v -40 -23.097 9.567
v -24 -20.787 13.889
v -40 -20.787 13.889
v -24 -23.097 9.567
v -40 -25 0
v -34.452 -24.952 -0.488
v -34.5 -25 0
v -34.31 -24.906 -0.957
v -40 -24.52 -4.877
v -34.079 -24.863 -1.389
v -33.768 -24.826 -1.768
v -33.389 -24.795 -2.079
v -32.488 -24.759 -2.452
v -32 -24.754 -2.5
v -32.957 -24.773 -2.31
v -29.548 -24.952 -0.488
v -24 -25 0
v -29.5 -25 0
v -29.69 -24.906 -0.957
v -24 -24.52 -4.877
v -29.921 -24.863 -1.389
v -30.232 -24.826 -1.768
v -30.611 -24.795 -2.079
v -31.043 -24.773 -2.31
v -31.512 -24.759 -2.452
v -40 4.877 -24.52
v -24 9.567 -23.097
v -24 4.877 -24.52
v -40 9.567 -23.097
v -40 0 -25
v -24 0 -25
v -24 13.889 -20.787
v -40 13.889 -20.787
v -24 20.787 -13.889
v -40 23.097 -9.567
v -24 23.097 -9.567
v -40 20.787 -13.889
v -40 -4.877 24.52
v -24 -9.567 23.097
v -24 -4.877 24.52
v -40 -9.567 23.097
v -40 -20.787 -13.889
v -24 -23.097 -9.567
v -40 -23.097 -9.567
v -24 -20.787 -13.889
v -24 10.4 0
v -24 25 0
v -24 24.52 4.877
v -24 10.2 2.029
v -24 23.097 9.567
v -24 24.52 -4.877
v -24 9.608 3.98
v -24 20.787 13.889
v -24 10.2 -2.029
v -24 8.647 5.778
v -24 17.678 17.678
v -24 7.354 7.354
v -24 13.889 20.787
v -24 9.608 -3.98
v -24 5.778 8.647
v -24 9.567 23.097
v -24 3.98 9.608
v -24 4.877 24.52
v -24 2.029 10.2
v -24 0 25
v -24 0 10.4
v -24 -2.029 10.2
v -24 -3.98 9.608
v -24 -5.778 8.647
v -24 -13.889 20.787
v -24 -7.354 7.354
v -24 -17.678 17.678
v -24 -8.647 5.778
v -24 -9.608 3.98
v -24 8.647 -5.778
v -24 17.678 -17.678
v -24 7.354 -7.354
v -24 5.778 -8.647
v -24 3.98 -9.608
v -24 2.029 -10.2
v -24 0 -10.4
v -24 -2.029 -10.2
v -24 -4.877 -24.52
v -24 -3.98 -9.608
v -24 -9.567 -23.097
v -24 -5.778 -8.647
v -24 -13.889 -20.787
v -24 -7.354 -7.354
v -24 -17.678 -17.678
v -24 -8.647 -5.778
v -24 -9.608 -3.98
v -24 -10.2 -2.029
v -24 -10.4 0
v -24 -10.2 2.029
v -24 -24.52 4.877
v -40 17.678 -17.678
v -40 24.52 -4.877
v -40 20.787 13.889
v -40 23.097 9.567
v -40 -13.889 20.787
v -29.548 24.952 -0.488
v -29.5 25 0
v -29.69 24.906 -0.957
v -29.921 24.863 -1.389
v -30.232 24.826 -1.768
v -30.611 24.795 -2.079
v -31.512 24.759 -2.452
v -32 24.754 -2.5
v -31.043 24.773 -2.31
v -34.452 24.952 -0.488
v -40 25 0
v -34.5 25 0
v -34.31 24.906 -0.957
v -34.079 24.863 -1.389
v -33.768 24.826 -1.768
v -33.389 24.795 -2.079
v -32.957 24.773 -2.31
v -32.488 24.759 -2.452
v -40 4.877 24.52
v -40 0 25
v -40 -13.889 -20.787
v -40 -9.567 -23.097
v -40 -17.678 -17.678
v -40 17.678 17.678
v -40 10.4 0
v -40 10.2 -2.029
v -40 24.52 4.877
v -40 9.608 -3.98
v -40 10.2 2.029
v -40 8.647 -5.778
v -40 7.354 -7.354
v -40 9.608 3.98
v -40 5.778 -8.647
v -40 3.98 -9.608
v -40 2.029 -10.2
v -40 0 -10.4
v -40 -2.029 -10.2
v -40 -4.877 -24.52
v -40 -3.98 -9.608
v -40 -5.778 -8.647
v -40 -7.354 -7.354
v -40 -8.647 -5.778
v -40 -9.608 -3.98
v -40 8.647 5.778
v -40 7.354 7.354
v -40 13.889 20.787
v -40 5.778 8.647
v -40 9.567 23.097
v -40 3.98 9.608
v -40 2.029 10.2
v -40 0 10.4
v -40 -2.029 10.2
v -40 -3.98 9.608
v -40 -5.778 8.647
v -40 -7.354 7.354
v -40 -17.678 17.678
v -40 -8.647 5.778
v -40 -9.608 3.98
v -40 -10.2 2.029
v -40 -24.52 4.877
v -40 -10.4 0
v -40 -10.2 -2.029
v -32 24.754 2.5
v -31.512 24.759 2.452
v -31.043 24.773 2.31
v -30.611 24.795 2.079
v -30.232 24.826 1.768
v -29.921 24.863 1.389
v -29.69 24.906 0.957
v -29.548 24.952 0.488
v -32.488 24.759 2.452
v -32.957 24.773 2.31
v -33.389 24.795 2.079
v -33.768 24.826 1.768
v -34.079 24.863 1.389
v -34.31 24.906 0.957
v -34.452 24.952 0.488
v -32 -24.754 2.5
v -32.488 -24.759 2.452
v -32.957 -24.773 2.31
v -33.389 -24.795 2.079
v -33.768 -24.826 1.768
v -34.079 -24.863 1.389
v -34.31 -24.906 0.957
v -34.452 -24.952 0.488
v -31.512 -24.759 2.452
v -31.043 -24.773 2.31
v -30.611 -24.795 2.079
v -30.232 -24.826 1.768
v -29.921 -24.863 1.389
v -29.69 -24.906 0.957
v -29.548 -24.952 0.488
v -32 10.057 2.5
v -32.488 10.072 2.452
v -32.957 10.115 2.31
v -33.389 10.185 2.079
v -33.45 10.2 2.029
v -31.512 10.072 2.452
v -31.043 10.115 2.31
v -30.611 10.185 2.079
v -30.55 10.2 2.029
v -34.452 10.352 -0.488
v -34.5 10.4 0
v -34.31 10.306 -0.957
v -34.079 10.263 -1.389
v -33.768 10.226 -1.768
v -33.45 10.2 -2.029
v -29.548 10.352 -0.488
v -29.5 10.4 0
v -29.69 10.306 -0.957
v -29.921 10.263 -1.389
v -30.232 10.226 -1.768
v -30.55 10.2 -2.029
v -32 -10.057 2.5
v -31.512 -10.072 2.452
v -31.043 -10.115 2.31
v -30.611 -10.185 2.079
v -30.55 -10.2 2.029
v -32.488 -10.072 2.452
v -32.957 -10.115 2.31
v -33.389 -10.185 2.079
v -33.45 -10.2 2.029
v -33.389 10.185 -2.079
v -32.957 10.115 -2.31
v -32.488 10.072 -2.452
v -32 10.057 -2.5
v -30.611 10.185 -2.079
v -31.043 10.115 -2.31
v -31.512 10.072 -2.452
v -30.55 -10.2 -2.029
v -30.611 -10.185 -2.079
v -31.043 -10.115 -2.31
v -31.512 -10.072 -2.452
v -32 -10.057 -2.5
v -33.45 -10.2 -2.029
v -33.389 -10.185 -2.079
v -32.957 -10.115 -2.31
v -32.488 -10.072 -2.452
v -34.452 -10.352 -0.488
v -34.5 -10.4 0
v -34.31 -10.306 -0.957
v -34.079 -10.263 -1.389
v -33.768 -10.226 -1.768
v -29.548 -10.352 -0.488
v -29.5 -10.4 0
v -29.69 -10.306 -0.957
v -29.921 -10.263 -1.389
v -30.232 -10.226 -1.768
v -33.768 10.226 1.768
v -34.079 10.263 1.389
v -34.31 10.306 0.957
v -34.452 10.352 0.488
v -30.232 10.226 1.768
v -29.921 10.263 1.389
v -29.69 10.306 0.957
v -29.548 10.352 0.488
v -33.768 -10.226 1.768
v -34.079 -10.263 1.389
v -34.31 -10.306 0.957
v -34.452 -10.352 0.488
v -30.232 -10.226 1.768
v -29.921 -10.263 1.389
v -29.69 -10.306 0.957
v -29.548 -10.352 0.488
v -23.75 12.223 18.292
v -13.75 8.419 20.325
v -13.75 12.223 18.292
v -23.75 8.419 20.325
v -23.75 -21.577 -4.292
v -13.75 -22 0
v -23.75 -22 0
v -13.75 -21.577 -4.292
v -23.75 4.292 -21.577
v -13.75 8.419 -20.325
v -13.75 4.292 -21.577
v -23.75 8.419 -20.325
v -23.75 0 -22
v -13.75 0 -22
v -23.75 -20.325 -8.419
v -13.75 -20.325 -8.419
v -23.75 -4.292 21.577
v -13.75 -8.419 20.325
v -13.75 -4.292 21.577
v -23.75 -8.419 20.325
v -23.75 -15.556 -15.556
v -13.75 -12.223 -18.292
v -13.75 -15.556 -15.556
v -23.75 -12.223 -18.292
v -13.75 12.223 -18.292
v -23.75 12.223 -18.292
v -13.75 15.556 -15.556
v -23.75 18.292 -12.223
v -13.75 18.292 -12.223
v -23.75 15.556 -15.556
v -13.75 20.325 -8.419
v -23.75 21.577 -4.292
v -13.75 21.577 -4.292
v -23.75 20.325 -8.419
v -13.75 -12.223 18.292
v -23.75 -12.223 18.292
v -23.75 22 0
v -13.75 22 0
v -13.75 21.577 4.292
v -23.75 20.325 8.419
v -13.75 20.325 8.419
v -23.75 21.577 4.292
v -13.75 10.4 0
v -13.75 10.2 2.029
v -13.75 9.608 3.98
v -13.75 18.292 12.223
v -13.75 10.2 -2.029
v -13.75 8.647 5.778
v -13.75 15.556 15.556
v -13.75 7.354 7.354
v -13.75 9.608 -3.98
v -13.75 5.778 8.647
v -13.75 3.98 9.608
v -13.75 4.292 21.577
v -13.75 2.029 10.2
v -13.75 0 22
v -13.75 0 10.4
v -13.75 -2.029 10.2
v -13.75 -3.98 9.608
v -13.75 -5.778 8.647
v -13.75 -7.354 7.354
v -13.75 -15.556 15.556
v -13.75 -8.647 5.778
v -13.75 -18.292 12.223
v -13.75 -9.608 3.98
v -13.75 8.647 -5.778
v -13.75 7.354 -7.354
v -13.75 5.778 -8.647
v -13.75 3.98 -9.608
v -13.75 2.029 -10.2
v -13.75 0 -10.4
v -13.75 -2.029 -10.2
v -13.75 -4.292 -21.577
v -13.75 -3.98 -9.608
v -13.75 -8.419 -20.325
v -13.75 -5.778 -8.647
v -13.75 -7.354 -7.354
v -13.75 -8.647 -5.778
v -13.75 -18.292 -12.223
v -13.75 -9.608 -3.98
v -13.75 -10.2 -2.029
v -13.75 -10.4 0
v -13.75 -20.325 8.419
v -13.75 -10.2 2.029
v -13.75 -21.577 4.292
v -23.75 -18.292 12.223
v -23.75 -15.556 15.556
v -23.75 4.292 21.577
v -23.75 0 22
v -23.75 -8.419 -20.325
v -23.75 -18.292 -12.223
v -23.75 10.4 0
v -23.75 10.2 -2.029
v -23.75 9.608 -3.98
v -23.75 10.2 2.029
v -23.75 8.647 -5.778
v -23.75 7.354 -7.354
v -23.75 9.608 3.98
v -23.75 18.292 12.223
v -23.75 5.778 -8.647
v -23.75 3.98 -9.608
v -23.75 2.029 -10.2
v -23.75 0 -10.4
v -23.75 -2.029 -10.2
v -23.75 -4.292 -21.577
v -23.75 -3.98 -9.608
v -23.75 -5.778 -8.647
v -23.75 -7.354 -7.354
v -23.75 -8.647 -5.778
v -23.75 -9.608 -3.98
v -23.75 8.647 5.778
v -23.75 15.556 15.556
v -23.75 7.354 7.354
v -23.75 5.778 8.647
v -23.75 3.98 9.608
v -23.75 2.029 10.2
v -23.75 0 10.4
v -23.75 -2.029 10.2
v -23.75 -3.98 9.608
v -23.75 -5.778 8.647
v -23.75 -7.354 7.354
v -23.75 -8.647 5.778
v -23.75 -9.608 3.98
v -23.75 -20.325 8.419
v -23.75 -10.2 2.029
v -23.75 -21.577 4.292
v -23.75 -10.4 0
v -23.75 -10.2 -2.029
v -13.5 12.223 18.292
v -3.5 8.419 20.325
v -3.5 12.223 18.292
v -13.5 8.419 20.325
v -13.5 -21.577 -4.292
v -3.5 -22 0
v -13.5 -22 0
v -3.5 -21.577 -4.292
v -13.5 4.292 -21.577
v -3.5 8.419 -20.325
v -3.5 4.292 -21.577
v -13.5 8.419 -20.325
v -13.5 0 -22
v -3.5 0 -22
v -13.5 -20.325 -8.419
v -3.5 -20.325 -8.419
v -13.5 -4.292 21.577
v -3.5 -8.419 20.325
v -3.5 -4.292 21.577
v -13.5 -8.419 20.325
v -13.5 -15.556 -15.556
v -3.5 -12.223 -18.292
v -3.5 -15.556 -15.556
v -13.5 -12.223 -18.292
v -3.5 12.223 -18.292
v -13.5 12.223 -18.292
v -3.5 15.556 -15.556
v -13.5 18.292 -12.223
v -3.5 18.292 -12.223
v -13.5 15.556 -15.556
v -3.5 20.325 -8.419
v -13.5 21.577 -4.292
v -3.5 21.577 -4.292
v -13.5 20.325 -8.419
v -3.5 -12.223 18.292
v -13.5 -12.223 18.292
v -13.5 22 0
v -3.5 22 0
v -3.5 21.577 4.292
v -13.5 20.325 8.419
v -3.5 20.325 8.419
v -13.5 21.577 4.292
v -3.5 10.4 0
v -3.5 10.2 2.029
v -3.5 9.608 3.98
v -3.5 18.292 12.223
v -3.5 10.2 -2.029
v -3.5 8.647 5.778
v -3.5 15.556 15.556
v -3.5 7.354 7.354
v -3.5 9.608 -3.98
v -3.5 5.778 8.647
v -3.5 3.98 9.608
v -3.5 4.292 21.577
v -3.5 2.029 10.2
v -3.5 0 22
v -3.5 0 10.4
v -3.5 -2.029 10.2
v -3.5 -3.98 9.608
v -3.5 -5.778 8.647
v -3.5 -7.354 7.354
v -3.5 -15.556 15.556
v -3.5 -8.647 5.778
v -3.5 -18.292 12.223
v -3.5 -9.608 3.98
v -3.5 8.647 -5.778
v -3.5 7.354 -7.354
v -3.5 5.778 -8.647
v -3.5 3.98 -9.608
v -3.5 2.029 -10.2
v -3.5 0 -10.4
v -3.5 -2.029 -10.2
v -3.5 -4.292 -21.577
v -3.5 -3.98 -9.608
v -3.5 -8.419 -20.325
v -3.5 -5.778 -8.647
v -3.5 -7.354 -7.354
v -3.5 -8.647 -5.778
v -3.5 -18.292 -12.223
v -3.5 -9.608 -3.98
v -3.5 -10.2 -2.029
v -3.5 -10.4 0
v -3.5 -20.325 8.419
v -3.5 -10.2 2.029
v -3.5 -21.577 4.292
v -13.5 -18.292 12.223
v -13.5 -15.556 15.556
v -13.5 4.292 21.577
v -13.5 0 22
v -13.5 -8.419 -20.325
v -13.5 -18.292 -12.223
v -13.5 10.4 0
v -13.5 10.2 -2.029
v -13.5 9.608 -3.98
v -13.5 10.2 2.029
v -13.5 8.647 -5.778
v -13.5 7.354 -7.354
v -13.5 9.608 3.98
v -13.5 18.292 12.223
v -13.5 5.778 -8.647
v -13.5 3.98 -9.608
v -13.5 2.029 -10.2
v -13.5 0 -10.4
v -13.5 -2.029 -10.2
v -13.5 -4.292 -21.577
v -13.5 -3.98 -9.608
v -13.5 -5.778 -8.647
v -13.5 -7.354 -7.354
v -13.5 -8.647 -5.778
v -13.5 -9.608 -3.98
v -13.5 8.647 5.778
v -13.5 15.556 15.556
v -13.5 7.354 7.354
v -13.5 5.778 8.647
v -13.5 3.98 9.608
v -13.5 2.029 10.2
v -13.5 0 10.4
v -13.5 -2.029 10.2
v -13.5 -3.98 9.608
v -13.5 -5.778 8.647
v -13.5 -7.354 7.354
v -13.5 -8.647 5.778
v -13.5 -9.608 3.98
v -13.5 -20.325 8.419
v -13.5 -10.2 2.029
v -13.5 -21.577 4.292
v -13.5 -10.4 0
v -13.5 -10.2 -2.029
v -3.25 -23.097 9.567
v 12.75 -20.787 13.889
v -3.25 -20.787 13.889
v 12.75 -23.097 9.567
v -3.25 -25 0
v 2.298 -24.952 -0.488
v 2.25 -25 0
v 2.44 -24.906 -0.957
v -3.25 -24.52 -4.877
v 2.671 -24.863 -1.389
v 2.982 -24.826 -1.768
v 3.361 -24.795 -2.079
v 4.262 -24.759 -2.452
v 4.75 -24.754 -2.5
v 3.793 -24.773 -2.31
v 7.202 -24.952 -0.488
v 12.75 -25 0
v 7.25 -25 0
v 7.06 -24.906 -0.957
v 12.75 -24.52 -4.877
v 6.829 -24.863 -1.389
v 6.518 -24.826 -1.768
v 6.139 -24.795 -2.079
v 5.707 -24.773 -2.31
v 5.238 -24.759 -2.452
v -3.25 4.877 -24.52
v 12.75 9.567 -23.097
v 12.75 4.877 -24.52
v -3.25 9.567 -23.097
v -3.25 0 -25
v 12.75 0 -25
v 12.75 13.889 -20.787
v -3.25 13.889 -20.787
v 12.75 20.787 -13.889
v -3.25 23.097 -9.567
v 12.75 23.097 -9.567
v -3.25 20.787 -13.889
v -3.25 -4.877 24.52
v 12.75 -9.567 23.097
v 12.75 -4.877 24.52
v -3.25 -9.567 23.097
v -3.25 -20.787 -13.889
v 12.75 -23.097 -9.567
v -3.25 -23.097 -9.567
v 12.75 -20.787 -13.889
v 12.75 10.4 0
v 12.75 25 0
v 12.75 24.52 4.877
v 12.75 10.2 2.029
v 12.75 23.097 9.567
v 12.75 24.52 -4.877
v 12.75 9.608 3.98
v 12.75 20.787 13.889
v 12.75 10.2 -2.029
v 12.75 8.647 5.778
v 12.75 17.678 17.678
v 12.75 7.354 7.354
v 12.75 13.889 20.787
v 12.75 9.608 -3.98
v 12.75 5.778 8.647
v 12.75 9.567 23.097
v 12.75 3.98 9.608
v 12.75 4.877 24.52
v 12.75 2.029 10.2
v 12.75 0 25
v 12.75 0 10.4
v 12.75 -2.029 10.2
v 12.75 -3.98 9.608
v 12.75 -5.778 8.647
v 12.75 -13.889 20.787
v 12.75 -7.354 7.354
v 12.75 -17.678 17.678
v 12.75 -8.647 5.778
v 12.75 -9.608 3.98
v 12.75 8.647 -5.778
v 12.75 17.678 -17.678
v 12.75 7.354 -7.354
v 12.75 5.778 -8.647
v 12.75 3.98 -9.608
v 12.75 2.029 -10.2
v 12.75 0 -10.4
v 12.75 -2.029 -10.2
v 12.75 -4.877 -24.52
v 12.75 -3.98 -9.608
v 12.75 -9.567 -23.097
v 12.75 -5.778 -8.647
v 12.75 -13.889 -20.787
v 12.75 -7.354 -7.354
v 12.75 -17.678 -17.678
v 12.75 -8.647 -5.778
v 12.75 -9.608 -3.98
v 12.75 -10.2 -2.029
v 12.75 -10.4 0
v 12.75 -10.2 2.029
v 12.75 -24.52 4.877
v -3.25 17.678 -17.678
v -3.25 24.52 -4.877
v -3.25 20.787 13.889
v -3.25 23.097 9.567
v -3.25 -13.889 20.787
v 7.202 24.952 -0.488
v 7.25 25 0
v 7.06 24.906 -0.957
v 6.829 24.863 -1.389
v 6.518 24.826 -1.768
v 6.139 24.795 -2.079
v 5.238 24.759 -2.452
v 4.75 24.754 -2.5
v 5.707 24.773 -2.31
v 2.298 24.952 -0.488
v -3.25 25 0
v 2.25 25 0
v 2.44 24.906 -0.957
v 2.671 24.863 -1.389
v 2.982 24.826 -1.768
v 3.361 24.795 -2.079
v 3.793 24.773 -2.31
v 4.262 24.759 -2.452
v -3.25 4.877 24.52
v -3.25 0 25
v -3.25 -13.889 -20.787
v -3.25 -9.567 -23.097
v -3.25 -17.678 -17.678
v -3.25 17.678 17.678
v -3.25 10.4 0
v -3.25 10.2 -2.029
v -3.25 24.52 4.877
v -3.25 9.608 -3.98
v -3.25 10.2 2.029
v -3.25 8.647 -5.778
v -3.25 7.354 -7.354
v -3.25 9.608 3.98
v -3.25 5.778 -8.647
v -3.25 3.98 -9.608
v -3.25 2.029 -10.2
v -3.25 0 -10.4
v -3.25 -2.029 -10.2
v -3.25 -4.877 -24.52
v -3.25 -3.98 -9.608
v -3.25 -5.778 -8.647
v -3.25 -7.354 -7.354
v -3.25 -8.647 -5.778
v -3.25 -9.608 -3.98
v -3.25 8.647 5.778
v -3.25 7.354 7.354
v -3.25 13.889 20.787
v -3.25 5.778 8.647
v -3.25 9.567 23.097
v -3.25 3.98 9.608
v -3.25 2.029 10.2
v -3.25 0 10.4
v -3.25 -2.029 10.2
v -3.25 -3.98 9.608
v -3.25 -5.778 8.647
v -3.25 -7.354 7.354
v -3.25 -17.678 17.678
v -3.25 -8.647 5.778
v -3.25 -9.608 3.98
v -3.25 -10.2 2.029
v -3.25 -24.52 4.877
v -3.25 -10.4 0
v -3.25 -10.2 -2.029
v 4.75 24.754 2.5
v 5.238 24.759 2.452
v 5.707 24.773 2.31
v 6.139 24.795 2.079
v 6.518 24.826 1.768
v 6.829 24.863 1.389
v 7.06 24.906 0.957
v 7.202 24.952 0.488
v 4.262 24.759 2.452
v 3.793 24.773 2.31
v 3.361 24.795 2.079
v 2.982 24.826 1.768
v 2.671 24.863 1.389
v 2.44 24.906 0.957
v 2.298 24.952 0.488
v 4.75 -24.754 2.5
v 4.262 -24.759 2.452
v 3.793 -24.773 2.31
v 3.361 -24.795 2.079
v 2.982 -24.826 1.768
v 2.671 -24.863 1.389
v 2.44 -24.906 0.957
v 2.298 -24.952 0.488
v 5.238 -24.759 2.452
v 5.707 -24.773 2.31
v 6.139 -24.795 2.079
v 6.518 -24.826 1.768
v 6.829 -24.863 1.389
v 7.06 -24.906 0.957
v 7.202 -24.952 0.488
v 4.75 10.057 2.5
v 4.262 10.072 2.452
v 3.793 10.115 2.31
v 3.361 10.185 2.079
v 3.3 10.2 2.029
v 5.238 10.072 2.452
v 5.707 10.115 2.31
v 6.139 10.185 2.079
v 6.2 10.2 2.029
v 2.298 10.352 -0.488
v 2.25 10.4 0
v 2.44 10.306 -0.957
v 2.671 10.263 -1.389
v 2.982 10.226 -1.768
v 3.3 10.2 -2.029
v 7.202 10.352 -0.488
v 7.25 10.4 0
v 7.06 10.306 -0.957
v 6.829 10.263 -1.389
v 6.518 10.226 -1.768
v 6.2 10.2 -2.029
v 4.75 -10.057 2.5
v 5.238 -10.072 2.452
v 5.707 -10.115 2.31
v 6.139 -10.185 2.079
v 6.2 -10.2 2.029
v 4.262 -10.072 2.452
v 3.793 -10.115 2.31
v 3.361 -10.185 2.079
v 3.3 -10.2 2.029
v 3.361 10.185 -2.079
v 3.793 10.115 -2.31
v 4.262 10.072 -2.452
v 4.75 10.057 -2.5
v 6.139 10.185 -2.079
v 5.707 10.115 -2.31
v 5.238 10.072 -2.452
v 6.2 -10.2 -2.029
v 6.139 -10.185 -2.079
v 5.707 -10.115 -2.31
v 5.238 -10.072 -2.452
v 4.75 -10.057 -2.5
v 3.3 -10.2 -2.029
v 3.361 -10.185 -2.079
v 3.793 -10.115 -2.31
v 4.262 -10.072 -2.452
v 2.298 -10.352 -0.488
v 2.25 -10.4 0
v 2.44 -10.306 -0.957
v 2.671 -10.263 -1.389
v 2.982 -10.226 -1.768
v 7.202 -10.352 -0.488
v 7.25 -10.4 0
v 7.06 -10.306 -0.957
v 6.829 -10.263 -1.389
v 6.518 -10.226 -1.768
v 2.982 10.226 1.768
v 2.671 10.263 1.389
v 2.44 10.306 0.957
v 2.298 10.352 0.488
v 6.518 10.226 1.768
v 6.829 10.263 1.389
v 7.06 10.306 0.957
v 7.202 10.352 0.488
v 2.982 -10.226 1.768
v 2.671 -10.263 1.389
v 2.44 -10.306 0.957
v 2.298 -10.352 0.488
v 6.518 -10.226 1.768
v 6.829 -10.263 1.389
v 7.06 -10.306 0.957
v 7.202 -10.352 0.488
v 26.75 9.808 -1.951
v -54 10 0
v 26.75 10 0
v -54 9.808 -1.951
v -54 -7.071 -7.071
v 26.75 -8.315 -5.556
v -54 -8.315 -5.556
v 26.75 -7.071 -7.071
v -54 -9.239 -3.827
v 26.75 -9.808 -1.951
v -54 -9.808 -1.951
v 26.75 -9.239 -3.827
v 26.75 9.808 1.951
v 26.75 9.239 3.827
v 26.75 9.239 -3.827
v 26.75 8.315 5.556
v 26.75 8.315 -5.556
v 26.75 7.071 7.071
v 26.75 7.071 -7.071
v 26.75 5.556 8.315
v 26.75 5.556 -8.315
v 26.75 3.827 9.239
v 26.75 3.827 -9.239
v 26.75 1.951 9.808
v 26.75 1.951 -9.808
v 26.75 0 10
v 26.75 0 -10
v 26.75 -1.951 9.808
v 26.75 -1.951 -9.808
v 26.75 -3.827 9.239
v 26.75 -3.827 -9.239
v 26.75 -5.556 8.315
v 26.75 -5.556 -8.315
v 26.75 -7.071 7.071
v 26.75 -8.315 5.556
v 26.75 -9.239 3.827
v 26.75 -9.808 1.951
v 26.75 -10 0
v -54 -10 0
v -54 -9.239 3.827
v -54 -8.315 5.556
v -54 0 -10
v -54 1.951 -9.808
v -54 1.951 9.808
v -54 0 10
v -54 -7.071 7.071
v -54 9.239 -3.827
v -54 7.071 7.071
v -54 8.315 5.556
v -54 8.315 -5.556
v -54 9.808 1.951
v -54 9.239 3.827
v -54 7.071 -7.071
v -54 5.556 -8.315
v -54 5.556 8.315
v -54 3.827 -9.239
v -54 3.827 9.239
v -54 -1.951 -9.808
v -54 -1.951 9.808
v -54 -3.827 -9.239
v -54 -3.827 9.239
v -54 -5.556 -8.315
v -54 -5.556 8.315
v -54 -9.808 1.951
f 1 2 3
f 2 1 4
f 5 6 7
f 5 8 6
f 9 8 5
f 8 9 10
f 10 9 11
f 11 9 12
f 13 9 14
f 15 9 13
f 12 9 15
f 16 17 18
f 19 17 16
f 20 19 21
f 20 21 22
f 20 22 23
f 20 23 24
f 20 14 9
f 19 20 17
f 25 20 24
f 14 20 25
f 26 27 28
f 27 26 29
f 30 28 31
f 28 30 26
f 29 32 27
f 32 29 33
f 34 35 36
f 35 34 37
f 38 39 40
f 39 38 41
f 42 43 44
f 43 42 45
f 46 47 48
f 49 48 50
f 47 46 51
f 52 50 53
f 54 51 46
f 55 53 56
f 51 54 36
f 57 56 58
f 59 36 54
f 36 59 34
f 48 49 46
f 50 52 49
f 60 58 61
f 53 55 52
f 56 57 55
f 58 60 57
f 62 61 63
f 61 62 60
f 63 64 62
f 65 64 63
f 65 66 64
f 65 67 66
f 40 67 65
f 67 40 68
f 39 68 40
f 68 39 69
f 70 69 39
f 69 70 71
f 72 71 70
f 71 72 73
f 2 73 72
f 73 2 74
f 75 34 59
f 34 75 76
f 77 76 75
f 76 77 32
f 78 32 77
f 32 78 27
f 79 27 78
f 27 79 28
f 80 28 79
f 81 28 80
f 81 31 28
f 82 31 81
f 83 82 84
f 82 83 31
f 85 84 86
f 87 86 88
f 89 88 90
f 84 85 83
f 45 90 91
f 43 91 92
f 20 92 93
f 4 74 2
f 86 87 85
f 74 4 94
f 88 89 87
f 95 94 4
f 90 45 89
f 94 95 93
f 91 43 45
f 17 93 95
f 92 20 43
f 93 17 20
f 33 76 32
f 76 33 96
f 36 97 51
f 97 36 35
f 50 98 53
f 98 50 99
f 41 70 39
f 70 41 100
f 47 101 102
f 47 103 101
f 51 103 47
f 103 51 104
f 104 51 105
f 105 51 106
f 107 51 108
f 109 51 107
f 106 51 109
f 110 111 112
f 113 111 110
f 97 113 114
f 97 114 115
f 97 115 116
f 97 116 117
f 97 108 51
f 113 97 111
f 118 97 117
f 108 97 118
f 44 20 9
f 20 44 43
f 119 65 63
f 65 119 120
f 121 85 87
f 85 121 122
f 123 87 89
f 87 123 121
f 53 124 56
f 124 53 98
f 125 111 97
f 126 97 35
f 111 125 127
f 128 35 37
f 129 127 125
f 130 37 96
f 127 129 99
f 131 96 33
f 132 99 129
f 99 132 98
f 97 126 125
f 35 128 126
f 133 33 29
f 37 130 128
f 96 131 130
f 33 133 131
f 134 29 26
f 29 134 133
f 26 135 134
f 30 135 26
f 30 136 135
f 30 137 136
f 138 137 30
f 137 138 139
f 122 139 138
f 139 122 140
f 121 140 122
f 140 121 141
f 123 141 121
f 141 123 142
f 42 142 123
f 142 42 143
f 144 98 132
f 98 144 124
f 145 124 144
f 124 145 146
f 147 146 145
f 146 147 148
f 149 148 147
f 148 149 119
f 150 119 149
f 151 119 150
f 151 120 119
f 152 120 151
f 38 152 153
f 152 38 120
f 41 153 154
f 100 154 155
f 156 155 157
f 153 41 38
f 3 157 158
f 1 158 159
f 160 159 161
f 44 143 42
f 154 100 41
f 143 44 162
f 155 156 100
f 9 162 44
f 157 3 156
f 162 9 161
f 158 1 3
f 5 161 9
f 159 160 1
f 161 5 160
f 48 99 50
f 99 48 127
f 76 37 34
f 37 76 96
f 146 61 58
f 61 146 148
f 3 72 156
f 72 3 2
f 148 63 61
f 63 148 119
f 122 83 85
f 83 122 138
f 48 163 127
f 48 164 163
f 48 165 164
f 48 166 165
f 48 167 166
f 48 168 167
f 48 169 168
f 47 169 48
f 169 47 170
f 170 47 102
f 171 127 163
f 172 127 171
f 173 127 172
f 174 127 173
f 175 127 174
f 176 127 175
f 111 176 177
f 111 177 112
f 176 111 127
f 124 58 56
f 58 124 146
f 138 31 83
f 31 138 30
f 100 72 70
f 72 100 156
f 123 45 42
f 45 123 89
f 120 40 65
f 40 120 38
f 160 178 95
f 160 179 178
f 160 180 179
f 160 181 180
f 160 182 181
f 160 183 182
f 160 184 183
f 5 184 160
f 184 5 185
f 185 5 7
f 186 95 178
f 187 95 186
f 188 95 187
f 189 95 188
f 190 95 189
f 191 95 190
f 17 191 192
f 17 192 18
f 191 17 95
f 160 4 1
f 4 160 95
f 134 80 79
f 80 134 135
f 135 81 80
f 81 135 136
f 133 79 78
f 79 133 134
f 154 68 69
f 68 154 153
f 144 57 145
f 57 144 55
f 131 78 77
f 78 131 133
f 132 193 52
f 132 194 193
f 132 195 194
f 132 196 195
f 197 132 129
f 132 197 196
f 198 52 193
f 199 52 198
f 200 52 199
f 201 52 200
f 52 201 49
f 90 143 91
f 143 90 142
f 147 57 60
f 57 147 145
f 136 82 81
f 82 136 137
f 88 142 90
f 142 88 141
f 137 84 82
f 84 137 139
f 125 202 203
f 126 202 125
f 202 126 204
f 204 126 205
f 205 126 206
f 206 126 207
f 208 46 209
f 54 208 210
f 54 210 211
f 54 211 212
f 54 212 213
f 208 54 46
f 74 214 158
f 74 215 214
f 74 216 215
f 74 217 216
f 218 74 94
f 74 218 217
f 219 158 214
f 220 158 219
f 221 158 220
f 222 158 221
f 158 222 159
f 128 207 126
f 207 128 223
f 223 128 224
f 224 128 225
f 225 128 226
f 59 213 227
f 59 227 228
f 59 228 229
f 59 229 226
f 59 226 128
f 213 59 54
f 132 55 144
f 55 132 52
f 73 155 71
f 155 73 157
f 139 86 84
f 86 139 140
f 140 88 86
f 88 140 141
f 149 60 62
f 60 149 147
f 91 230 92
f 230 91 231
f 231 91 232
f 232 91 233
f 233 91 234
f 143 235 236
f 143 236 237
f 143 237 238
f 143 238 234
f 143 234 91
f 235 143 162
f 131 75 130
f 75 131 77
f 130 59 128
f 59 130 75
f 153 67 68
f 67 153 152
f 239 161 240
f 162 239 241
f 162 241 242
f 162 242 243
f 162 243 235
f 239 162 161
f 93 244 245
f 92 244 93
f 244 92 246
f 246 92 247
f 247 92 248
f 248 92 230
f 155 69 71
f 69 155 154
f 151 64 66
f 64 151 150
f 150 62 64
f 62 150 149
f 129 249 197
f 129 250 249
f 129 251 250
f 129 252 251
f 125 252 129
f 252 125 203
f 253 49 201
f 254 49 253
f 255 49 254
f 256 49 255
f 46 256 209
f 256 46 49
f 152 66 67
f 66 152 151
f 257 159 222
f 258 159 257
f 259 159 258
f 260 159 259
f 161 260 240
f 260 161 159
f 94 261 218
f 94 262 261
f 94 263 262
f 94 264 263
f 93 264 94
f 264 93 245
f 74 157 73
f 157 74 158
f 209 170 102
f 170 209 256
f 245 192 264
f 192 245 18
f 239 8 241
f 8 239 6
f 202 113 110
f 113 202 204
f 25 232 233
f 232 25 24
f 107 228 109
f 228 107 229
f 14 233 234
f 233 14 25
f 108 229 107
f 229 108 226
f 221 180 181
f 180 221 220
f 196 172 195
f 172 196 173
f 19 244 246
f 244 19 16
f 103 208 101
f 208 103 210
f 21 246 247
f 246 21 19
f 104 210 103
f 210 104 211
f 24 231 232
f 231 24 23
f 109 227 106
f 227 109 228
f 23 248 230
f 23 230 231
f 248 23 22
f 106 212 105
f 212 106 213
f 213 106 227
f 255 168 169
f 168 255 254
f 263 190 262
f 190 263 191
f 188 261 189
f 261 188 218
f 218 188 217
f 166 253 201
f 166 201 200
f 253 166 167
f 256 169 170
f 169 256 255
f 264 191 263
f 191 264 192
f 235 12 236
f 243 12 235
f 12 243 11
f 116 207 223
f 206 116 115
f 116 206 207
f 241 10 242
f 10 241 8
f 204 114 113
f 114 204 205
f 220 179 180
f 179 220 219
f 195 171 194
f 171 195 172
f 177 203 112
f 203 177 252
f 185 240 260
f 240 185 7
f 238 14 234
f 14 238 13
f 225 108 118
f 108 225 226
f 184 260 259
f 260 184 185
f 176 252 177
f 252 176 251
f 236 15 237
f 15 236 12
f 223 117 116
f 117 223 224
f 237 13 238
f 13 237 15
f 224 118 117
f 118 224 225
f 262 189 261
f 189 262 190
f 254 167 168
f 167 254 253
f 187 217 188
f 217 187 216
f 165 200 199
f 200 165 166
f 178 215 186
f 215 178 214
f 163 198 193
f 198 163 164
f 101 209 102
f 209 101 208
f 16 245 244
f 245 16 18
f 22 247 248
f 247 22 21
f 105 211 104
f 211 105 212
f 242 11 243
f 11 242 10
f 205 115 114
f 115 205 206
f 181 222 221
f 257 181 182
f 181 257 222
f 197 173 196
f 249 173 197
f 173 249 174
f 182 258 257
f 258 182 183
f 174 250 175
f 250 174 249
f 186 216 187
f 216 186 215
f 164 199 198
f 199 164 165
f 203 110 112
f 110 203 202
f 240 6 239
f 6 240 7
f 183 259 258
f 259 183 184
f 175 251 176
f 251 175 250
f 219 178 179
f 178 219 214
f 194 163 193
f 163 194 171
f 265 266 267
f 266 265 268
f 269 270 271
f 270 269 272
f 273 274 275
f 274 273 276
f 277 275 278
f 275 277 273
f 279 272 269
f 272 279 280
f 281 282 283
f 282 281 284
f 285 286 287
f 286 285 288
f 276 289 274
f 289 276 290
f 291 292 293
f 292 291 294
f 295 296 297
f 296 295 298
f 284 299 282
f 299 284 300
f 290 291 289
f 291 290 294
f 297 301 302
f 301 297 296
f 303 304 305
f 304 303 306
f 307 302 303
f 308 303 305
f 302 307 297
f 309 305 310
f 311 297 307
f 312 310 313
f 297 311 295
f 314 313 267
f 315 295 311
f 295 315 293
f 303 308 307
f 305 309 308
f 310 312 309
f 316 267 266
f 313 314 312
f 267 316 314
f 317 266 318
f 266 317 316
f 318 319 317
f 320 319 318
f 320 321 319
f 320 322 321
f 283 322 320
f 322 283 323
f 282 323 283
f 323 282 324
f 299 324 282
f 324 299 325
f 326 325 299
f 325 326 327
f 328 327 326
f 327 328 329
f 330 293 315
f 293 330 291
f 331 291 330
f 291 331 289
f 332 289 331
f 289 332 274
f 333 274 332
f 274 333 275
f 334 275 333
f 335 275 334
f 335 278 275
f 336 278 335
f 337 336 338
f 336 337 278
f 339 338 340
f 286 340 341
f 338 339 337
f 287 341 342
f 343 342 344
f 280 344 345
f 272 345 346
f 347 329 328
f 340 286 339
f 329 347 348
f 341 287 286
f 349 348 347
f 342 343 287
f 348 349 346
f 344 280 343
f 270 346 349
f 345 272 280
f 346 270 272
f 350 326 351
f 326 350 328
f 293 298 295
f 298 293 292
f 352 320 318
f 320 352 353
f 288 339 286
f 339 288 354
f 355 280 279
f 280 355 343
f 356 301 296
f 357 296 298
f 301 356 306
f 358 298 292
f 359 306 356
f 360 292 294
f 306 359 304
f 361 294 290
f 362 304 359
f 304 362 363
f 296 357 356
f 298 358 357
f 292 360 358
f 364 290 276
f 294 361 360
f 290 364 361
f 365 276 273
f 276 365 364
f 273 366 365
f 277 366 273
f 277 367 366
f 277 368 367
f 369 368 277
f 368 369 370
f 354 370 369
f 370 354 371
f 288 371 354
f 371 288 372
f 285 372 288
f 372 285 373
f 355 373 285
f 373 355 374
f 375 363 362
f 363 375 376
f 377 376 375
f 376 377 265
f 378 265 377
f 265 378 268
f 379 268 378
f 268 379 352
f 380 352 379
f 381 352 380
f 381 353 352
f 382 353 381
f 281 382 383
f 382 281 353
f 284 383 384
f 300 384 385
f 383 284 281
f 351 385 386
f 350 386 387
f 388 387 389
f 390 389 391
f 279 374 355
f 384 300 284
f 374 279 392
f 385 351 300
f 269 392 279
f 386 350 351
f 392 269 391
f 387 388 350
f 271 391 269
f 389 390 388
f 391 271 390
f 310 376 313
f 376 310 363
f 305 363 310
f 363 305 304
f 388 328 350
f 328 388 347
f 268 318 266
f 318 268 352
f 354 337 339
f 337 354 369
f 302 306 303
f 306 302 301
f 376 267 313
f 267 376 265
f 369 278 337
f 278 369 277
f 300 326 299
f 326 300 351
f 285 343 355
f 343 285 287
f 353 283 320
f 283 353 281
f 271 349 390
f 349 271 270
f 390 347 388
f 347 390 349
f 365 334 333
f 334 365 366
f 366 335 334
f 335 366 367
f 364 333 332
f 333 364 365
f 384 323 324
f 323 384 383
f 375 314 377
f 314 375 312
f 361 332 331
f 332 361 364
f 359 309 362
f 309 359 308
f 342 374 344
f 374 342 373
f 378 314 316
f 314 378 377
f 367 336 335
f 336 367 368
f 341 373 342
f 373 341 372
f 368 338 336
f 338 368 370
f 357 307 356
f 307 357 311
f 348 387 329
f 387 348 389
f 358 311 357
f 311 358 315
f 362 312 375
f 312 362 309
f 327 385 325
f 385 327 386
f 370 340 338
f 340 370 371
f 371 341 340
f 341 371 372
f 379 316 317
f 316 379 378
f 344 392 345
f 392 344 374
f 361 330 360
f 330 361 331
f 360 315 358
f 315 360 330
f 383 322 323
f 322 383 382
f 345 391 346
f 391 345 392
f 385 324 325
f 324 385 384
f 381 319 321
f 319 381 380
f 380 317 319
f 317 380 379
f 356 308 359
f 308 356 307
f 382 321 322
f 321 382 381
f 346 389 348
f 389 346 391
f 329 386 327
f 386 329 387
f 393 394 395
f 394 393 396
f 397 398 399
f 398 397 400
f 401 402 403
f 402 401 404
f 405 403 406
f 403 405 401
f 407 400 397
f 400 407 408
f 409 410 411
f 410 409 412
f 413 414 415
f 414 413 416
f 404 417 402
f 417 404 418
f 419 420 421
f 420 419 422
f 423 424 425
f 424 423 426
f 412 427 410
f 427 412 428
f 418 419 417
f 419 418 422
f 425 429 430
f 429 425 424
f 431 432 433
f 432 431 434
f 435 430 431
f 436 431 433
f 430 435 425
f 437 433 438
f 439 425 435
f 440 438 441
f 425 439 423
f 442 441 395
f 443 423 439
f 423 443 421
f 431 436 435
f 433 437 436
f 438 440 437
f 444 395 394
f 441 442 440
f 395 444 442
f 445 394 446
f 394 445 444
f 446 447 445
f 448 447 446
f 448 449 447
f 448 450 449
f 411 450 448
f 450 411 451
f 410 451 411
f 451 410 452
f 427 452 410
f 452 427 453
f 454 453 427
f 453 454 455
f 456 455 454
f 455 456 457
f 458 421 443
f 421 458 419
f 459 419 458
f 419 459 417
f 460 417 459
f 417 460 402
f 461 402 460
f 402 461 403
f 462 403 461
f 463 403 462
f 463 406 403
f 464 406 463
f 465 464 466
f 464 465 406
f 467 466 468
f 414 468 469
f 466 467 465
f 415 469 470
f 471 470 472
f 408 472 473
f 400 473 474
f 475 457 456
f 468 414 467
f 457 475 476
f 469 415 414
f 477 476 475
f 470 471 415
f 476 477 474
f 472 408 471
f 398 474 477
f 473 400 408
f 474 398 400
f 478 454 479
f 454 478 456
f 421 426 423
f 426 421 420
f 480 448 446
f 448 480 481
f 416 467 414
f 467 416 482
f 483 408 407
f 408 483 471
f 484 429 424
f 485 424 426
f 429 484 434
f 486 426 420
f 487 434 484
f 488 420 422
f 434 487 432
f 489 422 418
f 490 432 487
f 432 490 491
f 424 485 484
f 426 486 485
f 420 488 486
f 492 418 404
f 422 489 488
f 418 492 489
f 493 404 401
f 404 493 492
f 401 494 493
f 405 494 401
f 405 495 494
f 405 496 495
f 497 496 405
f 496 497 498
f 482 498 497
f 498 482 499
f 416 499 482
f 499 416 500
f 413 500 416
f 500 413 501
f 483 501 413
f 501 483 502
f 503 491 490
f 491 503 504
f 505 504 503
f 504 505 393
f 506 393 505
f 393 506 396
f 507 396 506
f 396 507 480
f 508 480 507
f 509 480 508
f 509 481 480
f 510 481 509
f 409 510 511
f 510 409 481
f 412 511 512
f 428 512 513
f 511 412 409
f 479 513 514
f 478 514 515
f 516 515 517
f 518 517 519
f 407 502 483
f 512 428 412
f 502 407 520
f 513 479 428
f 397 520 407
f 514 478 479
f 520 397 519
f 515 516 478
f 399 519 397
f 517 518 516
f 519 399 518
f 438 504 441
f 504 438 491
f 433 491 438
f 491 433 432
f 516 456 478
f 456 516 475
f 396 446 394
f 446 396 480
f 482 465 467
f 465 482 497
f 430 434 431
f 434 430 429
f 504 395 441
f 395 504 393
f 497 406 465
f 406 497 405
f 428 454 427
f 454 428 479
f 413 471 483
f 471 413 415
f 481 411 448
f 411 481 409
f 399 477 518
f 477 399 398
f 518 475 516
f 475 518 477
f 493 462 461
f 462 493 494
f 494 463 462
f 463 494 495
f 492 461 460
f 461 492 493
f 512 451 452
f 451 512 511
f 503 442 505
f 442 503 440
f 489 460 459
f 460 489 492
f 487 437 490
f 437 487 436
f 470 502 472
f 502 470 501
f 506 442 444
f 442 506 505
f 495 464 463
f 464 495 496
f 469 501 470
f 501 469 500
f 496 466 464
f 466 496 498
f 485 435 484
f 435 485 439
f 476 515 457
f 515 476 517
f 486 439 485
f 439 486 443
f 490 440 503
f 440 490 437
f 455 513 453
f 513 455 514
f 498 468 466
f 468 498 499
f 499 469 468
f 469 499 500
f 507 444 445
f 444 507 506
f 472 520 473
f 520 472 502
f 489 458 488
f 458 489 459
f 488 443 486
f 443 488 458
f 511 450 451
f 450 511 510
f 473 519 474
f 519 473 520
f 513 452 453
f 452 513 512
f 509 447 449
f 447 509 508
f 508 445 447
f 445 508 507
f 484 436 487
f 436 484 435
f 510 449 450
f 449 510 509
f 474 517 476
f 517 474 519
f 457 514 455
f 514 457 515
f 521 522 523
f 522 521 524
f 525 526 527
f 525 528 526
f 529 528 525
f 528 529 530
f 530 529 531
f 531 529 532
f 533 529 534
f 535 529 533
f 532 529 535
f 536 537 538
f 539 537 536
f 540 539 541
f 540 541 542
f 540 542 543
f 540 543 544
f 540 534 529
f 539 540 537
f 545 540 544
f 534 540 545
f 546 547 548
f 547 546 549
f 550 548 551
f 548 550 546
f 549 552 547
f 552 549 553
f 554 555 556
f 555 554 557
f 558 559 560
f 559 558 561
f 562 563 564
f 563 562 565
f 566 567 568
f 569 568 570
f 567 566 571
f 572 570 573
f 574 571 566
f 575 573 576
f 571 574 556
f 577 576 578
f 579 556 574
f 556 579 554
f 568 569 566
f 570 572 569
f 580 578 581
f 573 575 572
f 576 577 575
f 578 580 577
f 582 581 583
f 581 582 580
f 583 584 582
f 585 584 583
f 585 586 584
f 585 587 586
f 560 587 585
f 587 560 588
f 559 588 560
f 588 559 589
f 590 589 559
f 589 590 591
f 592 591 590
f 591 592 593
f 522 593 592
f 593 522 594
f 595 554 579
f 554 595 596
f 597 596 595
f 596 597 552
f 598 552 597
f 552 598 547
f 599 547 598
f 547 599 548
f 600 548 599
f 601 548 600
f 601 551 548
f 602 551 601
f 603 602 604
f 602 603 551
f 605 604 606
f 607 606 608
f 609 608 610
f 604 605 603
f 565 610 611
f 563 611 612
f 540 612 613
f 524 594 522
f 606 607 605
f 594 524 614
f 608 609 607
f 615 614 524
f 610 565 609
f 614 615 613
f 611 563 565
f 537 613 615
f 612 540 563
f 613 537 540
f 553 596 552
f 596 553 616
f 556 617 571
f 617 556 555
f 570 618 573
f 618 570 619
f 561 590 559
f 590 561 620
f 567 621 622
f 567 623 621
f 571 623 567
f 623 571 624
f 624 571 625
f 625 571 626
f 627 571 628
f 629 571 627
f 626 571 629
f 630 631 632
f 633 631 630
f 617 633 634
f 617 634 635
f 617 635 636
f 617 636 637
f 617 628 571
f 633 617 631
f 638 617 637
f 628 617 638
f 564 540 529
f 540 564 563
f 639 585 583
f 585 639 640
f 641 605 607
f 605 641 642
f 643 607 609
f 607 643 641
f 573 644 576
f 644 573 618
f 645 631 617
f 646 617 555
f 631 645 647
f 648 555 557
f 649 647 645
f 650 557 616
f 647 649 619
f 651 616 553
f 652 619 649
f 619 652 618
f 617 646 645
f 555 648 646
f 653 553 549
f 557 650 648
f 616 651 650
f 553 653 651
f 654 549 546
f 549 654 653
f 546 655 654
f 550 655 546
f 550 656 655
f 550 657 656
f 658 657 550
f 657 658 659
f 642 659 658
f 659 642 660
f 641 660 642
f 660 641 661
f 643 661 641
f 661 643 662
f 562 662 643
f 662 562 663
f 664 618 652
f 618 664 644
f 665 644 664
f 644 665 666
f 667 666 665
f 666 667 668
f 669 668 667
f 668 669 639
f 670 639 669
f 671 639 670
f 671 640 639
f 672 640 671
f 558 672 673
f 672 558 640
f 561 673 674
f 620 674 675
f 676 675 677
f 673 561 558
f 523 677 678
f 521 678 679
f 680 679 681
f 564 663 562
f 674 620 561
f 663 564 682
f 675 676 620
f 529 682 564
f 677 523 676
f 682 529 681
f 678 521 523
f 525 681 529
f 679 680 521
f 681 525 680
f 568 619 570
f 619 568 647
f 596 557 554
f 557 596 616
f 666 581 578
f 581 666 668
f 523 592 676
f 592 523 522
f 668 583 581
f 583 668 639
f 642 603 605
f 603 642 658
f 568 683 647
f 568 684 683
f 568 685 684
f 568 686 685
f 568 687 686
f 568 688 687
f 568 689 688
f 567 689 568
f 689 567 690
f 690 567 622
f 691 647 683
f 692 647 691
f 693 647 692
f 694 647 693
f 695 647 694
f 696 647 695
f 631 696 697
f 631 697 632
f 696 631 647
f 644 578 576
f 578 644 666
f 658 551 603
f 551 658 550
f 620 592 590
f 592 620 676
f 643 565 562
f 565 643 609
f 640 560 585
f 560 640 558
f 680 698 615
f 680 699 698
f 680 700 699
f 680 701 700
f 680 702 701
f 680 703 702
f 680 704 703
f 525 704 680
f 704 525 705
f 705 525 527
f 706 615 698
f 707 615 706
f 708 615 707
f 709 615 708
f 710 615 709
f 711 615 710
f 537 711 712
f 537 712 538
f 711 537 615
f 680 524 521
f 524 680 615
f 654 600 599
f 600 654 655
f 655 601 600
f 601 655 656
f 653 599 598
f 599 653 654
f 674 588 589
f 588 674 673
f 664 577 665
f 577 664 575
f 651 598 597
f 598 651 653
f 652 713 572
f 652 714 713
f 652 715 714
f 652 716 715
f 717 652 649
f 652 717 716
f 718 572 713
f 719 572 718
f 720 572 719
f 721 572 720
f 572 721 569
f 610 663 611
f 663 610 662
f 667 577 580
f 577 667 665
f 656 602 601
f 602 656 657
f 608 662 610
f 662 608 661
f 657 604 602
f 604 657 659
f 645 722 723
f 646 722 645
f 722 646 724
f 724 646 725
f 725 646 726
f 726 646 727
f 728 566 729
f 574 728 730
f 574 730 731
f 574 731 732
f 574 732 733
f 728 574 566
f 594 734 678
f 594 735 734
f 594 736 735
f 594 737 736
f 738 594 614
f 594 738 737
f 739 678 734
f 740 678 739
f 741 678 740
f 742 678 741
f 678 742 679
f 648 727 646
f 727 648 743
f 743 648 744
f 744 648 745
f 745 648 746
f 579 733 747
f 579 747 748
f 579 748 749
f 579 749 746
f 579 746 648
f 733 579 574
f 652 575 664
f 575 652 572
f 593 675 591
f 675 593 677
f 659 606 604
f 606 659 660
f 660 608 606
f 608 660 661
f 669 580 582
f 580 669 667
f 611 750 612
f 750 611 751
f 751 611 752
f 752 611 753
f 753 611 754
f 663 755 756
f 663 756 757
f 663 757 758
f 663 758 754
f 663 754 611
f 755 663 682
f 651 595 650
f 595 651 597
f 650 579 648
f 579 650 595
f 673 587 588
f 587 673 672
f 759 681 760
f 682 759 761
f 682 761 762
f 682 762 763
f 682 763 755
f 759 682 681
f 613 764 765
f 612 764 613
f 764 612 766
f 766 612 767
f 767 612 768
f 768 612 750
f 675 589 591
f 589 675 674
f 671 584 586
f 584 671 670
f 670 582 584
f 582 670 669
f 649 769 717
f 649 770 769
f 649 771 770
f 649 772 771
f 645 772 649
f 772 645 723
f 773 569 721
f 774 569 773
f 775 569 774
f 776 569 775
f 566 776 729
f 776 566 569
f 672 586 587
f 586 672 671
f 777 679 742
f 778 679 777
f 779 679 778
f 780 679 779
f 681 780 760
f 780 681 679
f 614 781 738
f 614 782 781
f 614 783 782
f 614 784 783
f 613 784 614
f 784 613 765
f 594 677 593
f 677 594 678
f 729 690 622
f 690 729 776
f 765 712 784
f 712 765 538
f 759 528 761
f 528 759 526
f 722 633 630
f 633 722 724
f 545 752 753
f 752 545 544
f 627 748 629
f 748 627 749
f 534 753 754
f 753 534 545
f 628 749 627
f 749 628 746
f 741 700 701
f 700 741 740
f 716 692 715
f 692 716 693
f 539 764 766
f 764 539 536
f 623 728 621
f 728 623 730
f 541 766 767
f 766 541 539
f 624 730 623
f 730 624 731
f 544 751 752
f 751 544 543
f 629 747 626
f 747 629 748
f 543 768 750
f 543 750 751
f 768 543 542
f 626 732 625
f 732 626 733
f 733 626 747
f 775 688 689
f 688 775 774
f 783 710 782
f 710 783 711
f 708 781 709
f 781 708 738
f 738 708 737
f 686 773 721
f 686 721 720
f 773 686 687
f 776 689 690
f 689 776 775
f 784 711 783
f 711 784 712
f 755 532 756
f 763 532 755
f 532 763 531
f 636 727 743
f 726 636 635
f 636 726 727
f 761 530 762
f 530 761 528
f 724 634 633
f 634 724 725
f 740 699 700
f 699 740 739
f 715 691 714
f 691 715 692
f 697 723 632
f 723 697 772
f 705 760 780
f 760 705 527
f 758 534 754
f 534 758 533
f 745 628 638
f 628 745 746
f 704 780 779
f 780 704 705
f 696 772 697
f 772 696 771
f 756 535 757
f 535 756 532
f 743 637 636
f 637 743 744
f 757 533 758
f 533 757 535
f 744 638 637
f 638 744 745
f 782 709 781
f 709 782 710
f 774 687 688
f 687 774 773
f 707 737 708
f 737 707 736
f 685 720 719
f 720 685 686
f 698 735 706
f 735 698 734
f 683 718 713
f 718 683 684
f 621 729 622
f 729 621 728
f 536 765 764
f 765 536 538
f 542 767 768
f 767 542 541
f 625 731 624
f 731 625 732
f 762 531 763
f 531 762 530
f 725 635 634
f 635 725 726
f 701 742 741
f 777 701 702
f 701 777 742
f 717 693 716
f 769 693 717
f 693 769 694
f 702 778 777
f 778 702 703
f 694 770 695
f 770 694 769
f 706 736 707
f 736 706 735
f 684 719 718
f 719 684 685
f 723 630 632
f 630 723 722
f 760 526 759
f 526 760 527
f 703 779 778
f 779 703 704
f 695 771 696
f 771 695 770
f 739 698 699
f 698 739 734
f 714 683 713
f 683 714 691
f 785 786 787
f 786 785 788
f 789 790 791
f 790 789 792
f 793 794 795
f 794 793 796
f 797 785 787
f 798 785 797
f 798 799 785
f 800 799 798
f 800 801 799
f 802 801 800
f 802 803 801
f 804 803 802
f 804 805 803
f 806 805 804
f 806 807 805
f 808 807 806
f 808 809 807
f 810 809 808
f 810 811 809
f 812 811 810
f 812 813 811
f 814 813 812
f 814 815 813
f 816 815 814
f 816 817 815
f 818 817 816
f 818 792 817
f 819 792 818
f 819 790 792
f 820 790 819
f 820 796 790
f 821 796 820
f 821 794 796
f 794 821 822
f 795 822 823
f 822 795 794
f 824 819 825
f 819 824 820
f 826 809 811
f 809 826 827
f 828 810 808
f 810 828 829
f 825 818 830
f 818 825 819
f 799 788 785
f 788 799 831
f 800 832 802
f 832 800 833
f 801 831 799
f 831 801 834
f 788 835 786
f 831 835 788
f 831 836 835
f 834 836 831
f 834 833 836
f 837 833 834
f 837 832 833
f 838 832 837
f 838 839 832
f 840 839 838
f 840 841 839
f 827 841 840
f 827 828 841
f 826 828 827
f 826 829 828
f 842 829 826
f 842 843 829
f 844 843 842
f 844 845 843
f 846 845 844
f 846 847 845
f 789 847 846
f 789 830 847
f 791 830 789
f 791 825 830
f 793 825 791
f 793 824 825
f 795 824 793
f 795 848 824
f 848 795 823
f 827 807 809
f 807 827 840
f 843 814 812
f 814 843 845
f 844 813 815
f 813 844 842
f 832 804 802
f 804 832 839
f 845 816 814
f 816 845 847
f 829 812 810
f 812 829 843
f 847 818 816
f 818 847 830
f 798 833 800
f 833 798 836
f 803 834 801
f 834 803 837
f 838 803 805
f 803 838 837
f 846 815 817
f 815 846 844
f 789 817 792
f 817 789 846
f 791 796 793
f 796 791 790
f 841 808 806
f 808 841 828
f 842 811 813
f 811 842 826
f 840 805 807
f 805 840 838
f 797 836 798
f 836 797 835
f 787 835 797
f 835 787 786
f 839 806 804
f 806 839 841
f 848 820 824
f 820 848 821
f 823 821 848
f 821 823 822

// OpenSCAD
$fn = 32;

// ------------------------------------------------------------------------
// Shaft with rings and collars: d20 shaft, 4 rings
// Every part is its own module, assembly() places them once.
// ------------------------------------------------------------------------

// --- part 1 ---
module shaft() {
  translate([0, 0, -40.375]) cylinder(h = 80.75, d = 20);
}

// --- part 2 ---
module collar_a() {
  difference() {
    cylinder(h = 16, d = 50);
    translate([0, 0, -1]) cylinder(h = 18, d = 20.8);
    translate([0, 0, 8]) rotate([90, 0, 0]) cylinder(h = 52, d = 5, center = true);
  }
}

// --- part 3 ---
module spacer_a() {
  difference() {
      translate([0, 0, 0]) cylinder(h = 10, d = 44);
      translate([0, 0, -1]) cylinder(h = 12, d = 20.8);
    }
}

// --- part 4 ---
module spacer_b() {
  difference() {
      translate([0, 0, 0]) cylinder(h = 10, d = 44);
      translate([0, 0, -1]) cylinder(h = 12, d = 20.8);
    }
}

// --- part 5 ---
module collar_b() {
  difference() {
    cylinder(h = 16, d = 50);
    translate([0, 0, -1]) cylinder(h = 18, d = 20.8);
    translate([0, 0, 8]) rotate([90, 0, 0]) cylinder(h = 52, d = 5, center = true);
  }
}

// --- assembly ---
module assembly() {
  translate([-13.625, 0, 0]) rotate([0, 90, 0]) shaft();
  translate([-40, 0, 0]) rotate([0, 90, 0]) collar_a();
  translate([-23.75, 0, 0]) rotate([0, 90, 0]) spacer_a();
  translate([-13.5, 0, 0]) rotate([0, 90, 0]) spacer_b();
  translate([-3.25, 0, 0]) rotate([0, 90, 0]) collar_b();
}

assembly();
